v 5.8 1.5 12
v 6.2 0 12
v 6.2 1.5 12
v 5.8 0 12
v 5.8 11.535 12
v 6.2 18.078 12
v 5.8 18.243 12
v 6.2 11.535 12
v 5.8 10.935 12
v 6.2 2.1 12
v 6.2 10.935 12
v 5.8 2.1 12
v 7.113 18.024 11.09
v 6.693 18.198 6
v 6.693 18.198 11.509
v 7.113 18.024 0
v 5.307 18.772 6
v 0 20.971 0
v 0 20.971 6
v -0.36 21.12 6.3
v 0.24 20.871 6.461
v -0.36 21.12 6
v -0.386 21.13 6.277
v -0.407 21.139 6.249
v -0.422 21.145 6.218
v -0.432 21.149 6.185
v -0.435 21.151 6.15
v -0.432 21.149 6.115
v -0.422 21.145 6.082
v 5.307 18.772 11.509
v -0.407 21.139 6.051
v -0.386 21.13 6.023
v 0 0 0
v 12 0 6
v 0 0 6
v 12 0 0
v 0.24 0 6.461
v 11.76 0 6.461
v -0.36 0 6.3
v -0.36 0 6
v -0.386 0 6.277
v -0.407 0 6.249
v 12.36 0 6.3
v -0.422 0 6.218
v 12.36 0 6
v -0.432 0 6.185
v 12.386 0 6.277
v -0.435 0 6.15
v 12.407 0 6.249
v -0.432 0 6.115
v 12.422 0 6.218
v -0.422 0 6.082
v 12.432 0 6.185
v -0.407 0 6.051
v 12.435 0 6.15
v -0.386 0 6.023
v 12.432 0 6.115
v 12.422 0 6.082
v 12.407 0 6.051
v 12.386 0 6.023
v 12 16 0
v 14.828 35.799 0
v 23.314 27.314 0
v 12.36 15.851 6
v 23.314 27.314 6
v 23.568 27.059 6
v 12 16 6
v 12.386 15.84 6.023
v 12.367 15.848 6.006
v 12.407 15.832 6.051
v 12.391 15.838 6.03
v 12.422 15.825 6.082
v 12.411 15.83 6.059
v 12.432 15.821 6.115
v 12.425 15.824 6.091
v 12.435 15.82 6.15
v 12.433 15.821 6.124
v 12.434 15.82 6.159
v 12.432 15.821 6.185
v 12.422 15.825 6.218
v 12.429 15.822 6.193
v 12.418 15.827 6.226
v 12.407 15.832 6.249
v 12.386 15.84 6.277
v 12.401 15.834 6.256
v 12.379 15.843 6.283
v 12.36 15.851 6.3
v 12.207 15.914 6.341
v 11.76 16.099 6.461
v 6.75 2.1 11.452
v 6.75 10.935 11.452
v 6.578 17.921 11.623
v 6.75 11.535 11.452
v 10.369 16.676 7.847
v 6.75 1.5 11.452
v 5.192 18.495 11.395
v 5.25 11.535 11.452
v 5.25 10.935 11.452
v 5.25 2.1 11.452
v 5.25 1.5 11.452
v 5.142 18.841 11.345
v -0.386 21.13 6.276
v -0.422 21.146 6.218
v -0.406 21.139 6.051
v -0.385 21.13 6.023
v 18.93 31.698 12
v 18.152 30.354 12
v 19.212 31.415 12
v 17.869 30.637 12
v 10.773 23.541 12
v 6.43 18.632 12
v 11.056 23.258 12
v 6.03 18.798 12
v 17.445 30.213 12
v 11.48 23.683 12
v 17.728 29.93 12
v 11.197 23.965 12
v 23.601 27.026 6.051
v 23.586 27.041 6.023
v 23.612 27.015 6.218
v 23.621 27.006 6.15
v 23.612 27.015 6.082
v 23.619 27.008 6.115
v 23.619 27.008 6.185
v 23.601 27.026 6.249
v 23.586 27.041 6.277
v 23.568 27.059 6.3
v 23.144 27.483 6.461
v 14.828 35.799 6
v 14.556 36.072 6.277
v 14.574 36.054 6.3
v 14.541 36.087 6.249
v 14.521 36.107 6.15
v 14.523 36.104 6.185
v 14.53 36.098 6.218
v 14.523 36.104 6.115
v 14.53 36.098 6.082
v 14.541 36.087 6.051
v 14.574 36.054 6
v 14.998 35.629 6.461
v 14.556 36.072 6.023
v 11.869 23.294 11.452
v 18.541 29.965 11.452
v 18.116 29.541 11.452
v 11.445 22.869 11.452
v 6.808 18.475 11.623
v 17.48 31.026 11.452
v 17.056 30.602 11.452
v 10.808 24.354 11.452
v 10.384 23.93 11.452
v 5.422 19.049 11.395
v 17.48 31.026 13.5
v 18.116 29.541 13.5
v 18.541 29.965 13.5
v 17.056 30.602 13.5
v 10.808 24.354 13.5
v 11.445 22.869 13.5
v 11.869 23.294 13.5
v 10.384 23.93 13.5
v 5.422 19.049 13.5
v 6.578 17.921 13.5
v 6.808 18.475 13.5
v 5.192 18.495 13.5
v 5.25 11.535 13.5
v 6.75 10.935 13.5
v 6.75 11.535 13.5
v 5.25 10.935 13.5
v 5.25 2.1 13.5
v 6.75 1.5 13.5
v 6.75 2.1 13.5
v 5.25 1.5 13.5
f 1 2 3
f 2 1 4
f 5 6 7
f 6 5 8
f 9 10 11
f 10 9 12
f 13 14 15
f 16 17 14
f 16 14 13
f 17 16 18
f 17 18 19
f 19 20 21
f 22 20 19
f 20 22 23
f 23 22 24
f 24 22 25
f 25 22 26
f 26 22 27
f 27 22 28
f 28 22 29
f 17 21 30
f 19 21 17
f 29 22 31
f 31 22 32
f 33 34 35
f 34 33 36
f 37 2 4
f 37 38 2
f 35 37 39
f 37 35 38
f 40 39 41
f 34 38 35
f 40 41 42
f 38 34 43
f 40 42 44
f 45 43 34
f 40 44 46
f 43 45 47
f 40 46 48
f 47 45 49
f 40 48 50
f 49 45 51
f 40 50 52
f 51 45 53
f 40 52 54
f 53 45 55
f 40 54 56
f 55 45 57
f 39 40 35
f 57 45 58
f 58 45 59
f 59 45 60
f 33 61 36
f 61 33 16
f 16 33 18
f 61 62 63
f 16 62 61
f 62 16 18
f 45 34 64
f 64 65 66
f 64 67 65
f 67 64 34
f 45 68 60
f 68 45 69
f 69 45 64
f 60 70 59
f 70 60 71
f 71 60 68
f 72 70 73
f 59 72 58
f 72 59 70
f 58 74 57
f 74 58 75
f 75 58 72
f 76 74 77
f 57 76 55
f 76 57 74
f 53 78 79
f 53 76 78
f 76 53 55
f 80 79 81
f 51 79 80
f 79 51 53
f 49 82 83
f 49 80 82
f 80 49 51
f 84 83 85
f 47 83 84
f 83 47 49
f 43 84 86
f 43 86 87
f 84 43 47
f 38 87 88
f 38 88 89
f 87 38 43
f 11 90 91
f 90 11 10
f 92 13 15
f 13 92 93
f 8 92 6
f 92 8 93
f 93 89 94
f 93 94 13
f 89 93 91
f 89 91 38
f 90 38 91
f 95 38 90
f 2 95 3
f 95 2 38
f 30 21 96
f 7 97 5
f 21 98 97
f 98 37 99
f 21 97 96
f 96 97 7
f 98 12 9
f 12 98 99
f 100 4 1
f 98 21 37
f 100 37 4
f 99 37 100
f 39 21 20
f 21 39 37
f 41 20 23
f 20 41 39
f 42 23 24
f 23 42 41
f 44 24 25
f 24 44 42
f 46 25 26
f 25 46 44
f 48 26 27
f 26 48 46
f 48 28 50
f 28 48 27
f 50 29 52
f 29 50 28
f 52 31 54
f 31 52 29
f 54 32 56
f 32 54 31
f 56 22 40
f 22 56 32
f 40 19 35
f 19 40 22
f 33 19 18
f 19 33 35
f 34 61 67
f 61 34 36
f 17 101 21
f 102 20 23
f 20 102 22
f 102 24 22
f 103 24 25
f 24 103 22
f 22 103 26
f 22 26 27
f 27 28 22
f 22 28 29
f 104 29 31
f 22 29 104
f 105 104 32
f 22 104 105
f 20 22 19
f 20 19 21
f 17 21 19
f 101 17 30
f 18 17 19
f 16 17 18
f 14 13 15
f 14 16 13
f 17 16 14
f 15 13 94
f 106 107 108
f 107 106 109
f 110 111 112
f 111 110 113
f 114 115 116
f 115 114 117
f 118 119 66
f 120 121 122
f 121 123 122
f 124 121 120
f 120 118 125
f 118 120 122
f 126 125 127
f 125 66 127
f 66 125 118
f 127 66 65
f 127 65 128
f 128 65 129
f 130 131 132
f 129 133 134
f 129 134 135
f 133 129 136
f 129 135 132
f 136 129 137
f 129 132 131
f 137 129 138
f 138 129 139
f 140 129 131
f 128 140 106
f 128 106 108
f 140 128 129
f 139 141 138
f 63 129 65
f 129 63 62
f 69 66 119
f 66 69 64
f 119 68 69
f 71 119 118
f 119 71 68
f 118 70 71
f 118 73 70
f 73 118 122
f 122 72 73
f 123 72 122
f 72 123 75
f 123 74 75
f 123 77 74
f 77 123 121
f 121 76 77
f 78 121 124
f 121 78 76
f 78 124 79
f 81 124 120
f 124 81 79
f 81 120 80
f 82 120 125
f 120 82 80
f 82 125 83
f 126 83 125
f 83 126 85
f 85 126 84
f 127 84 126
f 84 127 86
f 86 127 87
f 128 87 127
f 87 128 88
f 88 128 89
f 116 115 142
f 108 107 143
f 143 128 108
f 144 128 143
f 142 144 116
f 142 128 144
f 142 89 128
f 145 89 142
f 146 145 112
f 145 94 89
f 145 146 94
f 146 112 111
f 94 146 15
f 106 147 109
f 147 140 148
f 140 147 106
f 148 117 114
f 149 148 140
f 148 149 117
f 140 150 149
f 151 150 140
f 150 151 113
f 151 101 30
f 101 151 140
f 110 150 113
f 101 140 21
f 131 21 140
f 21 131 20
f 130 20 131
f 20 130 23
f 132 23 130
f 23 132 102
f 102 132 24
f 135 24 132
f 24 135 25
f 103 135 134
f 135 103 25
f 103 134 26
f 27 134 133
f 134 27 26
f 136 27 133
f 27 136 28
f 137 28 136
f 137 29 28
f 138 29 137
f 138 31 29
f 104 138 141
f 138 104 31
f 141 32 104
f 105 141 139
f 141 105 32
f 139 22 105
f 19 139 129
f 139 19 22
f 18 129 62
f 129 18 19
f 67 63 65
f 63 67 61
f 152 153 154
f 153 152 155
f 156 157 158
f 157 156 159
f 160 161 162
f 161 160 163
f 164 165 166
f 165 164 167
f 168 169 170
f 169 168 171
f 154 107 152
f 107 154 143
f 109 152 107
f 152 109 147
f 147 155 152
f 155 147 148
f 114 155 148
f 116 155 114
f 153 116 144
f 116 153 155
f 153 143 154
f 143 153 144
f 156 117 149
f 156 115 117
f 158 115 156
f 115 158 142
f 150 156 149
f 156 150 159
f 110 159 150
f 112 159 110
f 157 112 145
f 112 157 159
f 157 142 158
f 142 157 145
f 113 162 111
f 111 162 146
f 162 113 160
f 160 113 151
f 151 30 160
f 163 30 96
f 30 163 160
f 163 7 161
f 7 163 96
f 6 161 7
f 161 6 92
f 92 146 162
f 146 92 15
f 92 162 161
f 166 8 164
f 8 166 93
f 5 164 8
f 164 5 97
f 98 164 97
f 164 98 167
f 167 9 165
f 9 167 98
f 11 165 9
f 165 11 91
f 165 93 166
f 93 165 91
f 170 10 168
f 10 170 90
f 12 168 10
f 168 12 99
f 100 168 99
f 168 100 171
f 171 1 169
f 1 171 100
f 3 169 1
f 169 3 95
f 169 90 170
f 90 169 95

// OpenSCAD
// Generated by Parametrix
ca_maison_faceSide1_000 = [ [ 0.0000, 0.0000 ],[ 12.0000, 0.0000 ],[ 12.0000, 6.0000 ],[ 12.3600, 6.0000 ],[ 12.3857, 6.0233 ],[ 12.4067, 6.0510 ],[ 12.4222, 6.0820 ],[ 12.4318, 6.1154 ],[ 12.4350, 6.1500 ],[ 12.4318, 6.1846 ],[ 12.4222, 6.2180 ],[ 12.4067, 6.2490 ],[ 12.3857, 6.2767 ],[ 12.3600, 6.3000 ],[ 11.7600, 6.4608 ],[ 6.2000, 12.0000 ],[ 5.8000, 12.0000 ],[ 0.2400, 6.4608 ],[ -0.3600, 6.3000 ],[ -0.3857, 6.2767 ],[ -0.4067, 6.2490 ],[ -0.4222, 6.2180 ],[ -0.4318, 6.1846 ],[ -0.4350, 6.1500 ],[ -0.4318, 6.1154 ],[ -0.4222, 6.0820 ],[ -0.4067, 6.0510 ],[ -0.3857, 6.0233 ],[ -0.3600, 6.0000 ],[ 0.0000, 6.0000 ],[ 0.0000, 0.0000 ] ];
cb_maison_faceSide1_000 = [  0, 1, 2, 3, 4, 5, 6, 7, 8, 9, 10, 11, 12, 13, 14, 15, 16, 17, 18, 19, 20, 21, 22, 23, 24, 25, 26, 27, 28, 29, 30 ];
a_maison_faceSide1 = concat(ca_maison_faceSide1_000);
b_maison_faceSide1 = [cb_maison_faceSide1_000];
ca_maison_faceSide2_000 = [ [ 0.0000, 0.0000 ],[ 12.0000, 0.0000 ],[ 12.0000, 6.0000 ],[ 12.3600, 6.0000 ],[ 12.3857, 6.0233 ],[ 12.4067, 6.0510 ],[ 12.4222, 6.0820 ],[ 12.4318, 6.1154 ],[ 12.4350, 6.1500 ],[ 12.4318, 6.1846 ],[ 12.4222, 6.2180 ],[ 12.4067, 6.2490 ],[ 12.3857, 6.2767 ],[ 12.3600, 6.3000 ],[ 11.7600, 6.4608 ],[ 6.2000, 12.0000 ],[ 5.8000, 12.0000 ],[ 0.2400, 6.4608 ],[ -0.3600, 6.3000 ],[ -0.3857, 6.2767 ],[ -0.4067, 6.2490 ],[ -0.4222, 6.2180 ],[ -0.4318, 6.1846 ],[ -0.4350, 6.1500 ],[ -0.4318, 6.1154 ],[ -0.4222, 6.0820 ],[ -0.4067, 6.0510 ],[ -0.3857, 6.0233 ],[ -0.3600, 6.0000 ],[ 0.0000, 6.0000 ],[ 0.0000, 0.0000 ] ];
cb_maison_faceSide2_000 = [  0, 1, 2, 3, 4, 5, 6, 7, 8, 9, 10, 11, 12, 13, 14, 15, 16, 17, 18, 19, 20, 21, 22, 23, 24, 25, 26, 27, 28, 29, 30 ];
a_maison_faceSide2 = concat(ca_maison_faceSide2_000);
b_maison_faceSide2 = [cb_maison_faceSide2_000];
ca_maison_faceTop1_000 = [ [ -0.9600, 0.0000 ],[ 12.9600, 0.0000 ],[ 12.9600, 15.6024 ],[ -0.9600, 21.3682 ],[ -0.9600, 0.0000 ] ];
cb_maison_faceTop1_000 = [  0, 1, 2, 3, 4 ];
a_maison_faceTop1 = concat(ca_maison_faceTop1_000);
b_maison_faceTop1 = [cb_maison_faceTop1_000];
ca_maison_faceTop2_000 = [ [ -0.9600, -0.3976 ],[ 12.9600, 5.3682 ],[ 12.9600, 20.9706 ],[ -0.9600, 20.9706 ],[ -0.9600, -0.3976 ] ];
cb_maison_faceTop2_000 = [  0, 1, 2, 3, 4 ];
a_maison_faceTop2 = concat(ca_maison_faceTop2_000);
b_maison_faceTop2 = [cb_maison_faceTop2_000];
ca_maison_faceChimney_000 = [ [ 5.2500, 1.5000 ],[ 6.7500, 1.5000 ],[ 6.7500, 2.1000 ],[ 5.2500, 2.1000 ],[ 5.2500, 1.5000 ] ];
cb_maison_faceChimney_000 = [  0, 1, 2, 3, 4 ];
ca_maison_faceChimney_001 = [ [ 17.0558, 30.6018 ],[ 18.1165, 29.5411 ],[ 18.5407, 29.9654 ],[ 17.4801, 31.0260 ],[ 17.0558, 30.6018 ] ];
cb_maison_faceChimney_001 = [  5, 6, 7, 8, 9 ];
ca_maison_faceChimney_002 = [ [ 5.1923, 18.4951 ],[ 6.5781, 17.9211 ],[ 6.8077, 18.4754 ],[ 5.4219, 19.0495 ],[ 5.1923, 18.4951 ] ];
cb_maison_faceChimney_002 = [  10, 11, 12, 13, 14 ];
ca_maison_faceChimney_003 = [ [ 5.2500, 10.9353 ],[ 6.7500, 10.9353 ],[ 6.7500, 11.5353 ],[ 5.2500, 11.5353 ],[ 5.2500, 10.9353 ] ];
cb_maison_faceChimney_003 = [  15, 16, 17, 18, 19 ];
ca_maison_faceChimney_004 = [ [ 10.3841, 23.9300 ],[ 11.4447, 22.8693 ],[ 11.8690, 23.2936 ],[ 10.8083, 24.3543 ],[ 10.3841, 23.9300 ] ];
cb_maison_faceChimney_004 = [  20, 21, 22, 23, 24 ];
a_maison_faceChimney = concat(ca_maison_faceChimney_000, ca_maison_faceChimney_001, ca_maison_faceChimney_002, ca_maison_faceChimney_003, ca_maison_faceChimney_004);
b_maison_faceChimney = [cb_maison_faceChimney_000, cb_maison_faceChimney_001, cb_maison_faceChimney_002, cb_maison_faceChimney_003, cb_maison_faceChimney_004];

module subpax_maison_top1 () {
	translate( [ 0, 0, 0 ])
		rotate( [ 0, 0, 0 ])
			   linear_extrude(height = 12) polygon(a_maison_faceTop1, b_maison_faceTop1);
}

module subpax_maison_side1 () {
	translate( [ 0, 21.36820776835531, 0 ])
		rotate( [ 90, 0, 0 ])
			   linear_extrude(height = 21.36820776835531) polygon(a_maison_faceSide1, b_maison_faceSide1);
}

module subpax_maison_top2 () {
	translate( [ 0, 20.97056274847714, 0 ])
		rotate( [ 0, 0, -45 ])
			   linear_extrude(height = 12) polygon(a_maison_faceTop2, b_maison_faceTop2);
}

module subpax_maison_side2 () {
	translate( [ 14.828427124746188, 35.79898987322333, 0 ])
		rotate( [ 90, 0, -45 ])
			   linear_extrude(height = 21.36820776835531) polygon(a_maison_faceSide2, b_maison_faceSide2);
}

module subpax_maison_chi1 () {
	translate( [ 0, 0, 6 ])
		rotate( [ 0, 0, 0 ])
			   linear_extrude(height = 7.5) polygon(a_maison_faceChimney, b_maison_faceChimney);
}

module ipax_maison_1 () {
	intersection () {
		subpax_maison_top1();
subpax_maison_side1();
	}
}

module ipax_maison_2 () {
	intersection () {
		subpax_maison_top2();
subpax_maison_side2();
	}
}

module pax_maison () {
	union () {
		ipax_maison_1();
ipax_maison_2();
subpax_maison_chi1();
	}
}

pax_maison();
